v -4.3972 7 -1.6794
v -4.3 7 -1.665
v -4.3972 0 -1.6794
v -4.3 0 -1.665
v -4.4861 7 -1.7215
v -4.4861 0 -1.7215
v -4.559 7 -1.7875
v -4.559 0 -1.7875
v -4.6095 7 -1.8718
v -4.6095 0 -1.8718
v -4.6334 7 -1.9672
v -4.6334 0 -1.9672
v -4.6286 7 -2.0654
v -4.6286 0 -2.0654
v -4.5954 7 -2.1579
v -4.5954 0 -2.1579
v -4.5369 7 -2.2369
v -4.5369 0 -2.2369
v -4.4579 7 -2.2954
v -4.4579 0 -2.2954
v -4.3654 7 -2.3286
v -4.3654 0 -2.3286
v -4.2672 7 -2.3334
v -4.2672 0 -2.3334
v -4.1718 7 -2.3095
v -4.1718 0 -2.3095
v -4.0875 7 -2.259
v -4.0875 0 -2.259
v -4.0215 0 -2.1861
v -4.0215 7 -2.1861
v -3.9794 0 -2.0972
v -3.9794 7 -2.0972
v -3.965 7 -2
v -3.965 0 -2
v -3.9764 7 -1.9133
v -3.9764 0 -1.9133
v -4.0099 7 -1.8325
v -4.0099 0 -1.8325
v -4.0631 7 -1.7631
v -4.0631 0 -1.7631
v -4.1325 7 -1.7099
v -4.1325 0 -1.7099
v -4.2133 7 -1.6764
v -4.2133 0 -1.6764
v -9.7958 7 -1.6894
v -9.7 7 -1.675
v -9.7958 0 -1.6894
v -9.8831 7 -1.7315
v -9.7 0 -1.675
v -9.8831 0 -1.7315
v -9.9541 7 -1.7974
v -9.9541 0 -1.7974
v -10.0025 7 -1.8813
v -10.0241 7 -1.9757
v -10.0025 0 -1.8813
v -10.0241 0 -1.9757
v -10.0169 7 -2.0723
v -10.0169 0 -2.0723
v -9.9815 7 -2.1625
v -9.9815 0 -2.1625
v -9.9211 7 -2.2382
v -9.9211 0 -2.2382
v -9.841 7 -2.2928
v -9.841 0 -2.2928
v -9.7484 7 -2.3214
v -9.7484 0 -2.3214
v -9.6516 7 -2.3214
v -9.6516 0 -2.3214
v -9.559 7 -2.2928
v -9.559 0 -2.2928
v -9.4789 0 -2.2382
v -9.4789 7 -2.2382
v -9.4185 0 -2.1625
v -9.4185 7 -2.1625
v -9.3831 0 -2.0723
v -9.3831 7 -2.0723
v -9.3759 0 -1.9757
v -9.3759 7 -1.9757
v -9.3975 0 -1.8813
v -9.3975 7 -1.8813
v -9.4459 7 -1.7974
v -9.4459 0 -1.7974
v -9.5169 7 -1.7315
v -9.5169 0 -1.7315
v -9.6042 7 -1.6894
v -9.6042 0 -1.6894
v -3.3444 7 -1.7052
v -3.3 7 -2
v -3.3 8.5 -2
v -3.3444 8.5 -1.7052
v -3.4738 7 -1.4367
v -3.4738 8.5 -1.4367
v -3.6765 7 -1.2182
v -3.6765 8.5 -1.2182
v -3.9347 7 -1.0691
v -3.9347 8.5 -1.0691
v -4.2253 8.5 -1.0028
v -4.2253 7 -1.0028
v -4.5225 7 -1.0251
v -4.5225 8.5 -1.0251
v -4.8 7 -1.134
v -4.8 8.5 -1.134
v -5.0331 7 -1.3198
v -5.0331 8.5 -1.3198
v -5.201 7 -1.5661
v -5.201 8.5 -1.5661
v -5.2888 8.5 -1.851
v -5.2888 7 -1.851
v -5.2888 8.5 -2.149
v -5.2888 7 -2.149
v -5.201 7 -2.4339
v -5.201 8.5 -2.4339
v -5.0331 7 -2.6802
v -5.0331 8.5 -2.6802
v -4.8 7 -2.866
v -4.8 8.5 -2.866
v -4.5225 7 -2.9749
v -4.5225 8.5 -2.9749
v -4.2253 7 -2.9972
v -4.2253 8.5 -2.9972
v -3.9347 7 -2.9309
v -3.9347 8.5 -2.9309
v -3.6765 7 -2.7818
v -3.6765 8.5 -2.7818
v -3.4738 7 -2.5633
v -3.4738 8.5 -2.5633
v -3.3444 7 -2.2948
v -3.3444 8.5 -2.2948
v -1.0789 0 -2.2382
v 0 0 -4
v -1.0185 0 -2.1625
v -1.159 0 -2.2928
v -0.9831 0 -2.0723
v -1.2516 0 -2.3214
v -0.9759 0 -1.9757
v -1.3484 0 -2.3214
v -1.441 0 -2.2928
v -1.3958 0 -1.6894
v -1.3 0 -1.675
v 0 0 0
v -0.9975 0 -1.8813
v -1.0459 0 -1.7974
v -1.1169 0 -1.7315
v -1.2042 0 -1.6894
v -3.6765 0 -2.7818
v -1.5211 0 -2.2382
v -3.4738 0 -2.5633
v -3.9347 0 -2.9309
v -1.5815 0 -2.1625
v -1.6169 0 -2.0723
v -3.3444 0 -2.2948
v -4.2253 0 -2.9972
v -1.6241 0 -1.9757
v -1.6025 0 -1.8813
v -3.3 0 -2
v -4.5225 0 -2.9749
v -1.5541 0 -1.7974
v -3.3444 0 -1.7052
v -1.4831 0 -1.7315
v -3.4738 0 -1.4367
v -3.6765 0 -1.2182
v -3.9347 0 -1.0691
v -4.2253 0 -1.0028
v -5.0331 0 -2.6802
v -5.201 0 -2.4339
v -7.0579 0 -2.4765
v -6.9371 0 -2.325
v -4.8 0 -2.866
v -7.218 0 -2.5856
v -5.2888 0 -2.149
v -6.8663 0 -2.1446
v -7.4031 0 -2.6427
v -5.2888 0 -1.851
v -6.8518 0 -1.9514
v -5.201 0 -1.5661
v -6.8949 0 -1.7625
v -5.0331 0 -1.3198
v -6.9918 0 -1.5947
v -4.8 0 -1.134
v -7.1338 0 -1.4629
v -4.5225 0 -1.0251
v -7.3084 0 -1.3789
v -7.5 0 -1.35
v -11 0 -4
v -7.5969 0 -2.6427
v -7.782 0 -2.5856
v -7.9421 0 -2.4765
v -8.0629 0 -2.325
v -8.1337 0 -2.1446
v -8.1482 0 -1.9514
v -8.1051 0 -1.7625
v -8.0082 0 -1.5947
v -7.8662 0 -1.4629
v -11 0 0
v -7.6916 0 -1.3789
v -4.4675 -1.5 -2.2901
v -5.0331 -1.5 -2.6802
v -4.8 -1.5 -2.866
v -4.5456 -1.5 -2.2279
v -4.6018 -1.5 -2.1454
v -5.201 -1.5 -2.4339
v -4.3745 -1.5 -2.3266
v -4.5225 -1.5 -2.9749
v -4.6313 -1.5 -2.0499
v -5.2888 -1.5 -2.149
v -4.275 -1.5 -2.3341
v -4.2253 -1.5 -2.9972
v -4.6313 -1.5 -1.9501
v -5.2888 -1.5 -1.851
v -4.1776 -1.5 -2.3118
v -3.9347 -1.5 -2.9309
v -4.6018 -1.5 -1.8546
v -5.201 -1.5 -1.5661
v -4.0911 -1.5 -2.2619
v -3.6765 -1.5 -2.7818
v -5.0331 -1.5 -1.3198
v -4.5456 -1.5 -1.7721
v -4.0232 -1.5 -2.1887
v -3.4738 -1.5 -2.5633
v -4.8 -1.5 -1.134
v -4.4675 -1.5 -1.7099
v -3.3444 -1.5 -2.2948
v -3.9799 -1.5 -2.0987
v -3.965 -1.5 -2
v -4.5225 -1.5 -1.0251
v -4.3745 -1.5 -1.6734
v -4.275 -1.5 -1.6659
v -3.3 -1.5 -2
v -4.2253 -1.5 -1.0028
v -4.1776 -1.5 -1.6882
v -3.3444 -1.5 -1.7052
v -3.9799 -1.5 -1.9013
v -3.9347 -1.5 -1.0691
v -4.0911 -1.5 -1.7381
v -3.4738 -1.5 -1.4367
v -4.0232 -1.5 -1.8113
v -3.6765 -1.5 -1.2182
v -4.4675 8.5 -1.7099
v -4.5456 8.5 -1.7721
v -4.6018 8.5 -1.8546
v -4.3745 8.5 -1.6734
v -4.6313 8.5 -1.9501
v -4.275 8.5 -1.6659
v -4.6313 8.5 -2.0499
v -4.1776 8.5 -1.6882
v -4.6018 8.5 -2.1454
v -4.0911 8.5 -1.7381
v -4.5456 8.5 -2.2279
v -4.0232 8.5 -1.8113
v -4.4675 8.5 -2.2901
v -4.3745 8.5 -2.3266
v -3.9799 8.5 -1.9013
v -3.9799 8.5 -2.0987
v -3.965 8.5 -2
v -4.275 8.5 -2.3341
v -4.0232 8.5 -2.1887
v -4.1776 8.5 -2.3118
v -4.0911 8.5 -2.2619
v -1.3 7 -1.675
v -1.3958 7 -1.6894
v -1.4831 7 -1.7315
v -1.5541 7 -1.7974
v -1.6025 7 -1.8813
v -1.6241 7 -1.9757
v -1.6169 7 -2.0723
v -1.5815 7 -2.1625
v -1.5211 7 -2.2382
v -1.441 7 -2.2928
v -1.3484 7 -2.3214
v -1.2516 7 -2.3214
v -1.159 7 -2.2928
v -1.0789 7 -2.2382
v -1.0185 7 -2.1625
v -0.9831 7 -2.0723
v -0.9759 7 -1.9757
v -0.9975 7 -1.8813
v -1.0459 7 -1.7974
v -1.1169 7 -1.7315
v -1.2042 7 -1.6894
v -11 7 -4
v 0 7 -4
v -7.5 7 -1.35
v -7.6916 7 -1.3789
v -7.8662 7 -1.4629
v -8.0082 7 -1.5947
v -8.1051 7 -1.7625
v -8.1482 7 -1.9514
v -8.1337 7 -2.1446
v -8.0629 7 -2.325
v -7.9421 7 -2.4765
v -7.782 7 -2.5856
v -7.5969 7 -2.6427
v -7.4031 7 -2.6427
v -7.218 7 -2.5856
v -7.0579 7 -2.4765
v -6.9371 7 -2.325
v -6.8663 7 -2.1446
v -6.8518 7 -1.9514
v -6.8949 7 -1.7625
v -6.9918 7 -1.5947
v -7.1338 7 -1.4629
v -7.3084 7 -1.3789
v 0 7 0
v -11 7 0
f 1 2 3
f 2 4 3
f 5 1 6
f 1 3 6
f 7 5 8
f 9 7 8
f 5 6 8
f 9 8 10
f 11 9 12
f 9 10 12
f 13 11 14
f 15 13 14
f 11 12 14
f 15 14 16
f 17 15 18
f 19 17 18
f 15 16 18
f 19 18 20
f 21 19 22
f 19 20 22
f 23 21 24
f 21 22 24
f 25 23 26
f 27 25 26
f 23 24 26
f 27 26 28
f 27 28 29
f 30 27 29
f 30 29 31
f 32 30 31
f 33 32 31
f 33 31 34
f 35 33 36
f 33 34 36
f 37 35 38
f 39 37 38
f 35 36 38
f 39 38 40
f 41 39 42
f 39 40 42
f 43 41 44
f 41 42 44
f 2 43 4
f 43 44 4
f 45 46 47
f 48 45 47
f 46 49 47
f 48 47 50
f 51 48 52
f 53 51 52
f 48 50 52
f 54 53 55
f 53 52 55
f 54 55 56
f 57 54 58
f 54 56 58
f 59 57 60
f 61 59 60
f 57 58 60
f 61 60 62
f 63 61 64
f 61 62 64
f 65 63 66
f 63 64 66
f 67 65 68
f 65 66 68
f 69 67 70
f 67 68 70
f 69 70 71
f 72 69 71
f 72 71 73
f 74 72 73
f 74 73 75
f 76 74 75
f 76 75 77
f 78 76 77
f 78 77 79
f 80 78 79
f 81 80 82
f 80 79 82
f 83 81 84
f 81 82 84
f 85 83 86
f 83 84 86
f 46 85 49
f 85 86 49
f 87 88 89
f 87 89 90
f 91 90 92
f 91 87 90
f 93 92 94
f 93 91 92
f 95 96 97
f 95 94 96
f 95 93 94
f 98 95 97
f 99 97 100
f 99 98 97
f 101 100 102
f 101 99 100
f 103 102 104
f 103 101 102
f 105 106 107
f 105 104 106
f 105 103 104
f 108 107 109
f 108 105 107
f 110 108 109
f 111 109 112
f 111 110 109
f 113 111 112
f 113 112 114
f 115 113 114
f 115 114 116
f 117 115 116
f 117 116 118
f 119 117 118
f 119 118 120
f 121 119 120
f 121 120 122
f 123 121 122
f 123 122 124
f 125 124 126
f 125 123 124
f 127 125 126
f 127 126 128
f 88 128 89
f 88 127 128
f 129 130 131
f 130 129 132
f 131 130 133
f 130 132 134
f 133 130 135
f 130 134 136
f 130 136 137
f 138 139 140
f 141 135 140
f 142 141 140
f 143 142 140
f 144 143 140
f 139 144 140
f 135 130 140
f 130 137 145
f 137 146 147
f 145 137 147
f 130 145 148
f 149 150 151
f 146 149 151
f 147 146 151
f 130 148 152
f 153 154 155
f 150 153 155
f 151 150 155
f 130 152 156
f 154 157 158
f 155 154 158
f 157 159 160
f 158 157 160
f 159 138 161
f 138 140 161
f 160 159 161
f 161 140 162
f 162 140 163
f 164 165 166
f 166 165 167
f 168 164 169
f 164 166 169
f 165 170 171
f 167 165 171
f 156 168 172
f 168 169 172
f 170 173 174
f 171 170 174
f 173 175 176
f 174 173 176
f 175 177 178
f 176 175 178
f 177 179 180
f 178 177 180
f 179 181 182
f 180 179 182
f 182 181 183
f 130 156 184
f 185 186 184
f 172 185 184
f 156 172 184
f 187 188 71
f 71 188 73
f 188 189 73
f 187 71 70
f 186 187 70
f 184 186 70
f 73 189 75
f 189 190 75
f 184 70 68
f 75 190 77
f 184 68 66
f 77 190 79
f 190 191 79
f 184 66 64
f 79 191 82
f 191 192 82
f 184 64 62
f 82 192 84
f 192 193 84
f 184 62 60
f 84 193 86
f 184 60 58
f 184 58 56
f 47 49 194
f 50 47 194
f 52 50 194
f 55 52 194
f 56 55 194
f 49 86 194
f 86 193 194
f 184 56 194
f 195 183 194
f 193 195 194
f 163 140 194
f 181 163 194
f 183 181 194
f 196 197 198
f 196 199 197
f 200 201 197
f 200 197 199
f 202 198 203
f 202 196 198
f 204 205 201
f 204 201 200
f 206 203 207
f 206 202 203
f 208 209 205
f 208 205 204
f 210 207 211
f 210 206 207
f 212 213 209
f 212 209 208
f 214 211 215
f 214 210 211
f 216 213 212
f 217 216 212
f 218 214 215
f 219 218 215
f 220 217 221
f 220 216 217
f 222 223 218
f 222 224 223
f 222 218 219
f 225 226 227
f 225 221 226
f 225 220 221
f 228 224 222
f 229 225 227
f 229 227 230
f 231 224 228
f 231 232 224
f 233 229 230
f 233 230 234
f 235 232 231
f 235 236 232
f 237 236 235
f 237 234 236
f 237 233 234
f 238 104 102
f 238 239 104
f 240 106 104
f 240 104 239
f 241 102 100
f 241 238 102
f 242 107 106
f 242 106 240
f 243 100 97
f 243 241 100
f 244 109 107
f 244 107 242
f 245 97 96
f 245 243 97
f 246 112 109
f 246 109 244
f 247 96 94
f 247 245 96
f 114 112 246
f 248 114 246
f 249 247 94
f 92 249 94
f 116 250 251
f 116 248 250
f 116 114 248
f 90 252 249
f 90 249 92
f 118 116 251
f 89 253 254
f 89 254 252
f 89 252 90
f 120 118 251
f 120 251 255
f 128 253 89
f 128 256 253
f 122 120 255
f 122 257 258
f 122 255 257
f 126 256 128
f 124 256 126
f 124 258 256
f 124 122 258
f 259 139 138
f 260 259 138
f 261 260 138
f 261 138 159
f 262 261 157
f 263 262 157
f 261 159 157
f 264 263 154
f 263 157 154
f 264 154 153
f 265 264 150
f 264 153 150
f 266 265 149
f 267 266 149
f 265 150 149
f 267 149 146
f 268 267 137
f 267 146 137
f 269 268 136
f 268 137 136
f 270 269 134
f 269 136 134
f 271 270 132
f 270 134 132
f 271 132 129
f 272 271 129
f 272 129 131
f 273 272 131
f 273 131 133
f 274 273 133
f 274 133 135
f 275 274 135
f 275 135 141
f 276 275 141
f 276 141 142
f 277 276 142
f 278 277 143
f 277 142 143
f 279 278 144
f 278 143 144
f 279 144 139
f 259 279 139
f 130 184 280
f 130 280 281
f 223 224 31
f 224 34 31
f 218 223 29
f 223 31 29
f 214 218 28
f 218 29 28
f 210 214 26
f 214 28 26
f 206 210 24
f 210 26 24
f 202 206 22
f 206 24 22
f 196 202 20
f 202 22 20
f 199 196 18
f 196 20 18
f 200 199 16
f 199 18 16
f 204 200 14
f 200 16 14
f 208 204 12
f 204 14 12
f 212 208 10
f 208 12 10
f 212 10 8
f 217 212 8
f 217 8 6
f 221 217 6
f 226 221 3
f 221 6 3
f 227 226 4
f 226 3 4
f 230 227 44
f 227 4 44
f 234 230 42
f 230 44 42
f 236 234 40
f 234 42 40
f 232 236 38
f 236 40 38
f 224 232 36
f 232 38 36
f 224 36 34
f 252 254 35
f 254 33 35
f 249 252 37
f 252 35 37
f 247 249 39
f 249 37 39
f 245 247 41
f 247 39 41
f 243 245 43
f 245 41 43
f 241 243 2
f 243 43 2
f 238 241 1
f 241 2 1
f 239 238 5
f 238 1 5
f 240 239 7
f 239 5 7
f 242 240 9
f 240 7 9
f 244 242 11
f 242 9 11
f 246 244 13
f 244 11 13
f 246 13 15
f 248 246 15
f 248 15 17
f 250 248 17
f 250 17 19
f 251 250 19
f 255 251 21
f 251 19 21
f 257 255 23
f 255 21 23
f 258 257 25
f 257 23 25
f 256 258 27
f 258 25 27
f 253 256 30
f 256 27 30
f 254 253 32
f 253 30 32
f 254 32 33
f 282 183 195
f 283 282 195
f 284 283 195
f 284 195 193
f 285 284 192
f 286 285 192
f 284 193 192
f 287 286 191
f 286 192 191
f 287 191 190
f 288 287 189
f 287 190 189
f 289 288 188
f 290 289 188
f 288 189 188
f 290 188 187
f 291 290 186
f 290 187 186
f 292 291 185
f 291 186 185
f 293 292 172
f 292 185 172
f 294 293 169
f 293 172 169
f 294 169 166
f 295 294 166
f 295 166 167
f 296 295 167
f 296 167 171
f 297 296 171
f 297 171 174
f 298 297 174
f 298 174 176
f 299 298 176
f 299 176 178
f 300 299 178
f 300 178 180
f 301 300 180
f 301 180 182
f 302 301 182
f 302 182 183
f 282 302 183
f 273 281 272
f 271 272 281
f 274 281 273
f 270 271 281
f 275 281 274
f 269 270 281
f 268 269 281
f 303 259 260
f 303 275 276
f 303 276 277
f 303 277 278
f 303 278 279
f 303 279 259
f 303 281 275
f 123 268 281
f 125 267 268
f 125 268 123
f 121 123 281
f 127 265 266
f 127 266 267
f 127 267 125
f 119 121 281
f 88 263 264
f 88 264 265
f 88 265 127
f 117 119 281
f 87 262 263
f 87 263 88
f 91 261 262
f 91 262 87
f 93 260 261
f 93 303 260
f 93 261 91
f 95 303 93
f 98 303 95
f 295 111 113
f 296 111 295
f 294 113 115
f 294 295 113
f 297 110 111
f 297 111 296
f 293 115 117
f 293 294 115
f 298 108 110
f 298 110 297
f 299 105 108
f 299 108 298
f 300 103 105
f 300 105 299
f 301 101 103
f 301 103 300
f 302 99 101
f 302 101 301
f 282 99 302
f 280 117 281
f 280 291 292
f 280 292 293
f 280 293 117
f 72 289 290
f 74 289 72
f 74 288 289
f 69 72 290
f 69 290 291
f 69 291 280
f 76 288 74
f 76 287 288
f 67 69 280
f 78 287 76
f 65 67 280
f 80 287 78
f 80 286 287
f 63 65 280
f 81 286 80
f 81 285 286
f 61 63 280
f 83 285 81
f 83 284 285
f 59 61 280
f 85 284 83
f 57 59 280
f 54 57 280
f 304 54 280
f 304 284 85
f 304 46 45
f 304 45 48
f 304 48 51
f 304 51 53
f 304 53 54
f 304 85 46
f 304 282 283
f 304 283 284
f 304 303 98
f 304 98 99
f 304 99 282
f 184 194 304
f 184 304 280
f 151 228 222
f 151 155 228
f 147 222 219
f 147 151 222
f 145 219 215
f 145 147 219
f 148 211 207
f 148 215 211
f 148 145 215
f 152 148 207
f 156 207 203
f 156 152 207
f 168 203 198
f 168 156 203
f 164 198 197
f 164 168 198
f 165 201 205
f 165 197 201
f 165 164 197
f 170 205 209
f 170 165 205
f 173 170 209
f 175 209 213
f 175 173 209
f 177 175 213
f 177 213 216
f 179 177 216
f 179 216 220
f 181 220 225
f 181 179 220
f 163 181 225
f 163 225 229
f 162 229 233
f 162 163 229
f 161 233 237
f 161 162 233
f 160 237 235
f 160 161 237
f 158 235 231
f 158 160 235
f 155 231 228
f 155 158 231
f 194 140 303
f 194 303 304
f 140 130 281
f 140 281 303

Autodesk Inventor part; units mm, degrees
ref_plane "YZ Plane" through (0, 0, 0) normal (1, 0, 0) x (0, 1, 0)
ref_plane "XZ Plane" through (0, 0, 0) normal (0, 1, 0) x (-1, 0, 0)
ref_plane "XY Plane" through (0, 0, 0) normal (0, 0, 1) x (1, 0, 0)
sketch "스케치1" plane through (0, 0, 0) normal (0, 1, 0) x (-1, 0, 0)
  line L0 (0, 0) -> (11, 0)
  line L1 (11, 0) -> (11, -4)
  line L2 (11, -4) -> (0, -4)
  line L3 (0, -4) -> (0, 0)
  dimension "d0" = 11
  dimension "d1" = 4
extrude "돌출1" add sketch "스케치1" along normal blind 7
sketch "스케치2" plane through (0, 7, 0) normal (0, 1, 0) x (1, 0, 0)
  line L0 (0, 0) -> (0, 4) construction
  line L1 (0, 2) -> (-11, 2) construction
  line L2 (-11, 4) -> (-11, 0) construction
  point P0 (-1.3, 2)
  point P1 (-4.3, 2)
  point P2 (-7.5, 2)
  point P3 (-9.7, 2)
  point P4 (-4.3, 2)
  dimension "d59" = 1.3
  dimension "d60" = 2.2
  dimension "d61" = 3.2
  dimension "d62" = 1.3
  dimension "d69" = 0
hole "구멍1" at (-9.7, 7, -2) at (-1.3, 7, -2) direction (0, -1, 0) diameter 0.65 end through all
hole "구멍2" at (-7.5, 7, -2) direction (0, -1, 0) diameter 1.3 end through all
hole "구멍3" at (-4.3, 7, -2) direction (0, -1, 0) diameter 0.67 end through all
sketch "스케치3" plane through (0, 7, 0) normal (0, 1, 0) x (1, 0, 0)
  circle A0 centre (-4.3, 2) radius 1
  circle A1 centre (-4.3, 2) radius 0.335 projected
  point P0 (0, 0)
  point P1 (-4.3, 2)
  dimension "d50" = 2
extrude "돌출2" add sketch "스케치3" along normal blind 1.5
sketch "스케치4" plane through (0, 0, 0) normal (0, -1, 0) x (1, 0, 0)
  circle A0 centre (-4.3, -2) radius 1
  circle A1 centre (-4.3, -2) radius 0.335 projected
  point P0 (0, 0)
  point P1 (-4.3, -2)
  dimension "d53" = 2
extrude "돌출3" add sketch "스케치4" along normal blind 1.5
equation "\"d8\" = G23_F"
equation "\"d15\" = Screw_F"
equation "\"d22\" = G23_M"
equation "\"G23_F\" = 0.65"
equation "\"G23_M\" = 0.67"
equation "\"Screw_F\" = 1.3"
equation "\"Screw_M\" = 1.6"
properties part number "_3D 인쇄"
